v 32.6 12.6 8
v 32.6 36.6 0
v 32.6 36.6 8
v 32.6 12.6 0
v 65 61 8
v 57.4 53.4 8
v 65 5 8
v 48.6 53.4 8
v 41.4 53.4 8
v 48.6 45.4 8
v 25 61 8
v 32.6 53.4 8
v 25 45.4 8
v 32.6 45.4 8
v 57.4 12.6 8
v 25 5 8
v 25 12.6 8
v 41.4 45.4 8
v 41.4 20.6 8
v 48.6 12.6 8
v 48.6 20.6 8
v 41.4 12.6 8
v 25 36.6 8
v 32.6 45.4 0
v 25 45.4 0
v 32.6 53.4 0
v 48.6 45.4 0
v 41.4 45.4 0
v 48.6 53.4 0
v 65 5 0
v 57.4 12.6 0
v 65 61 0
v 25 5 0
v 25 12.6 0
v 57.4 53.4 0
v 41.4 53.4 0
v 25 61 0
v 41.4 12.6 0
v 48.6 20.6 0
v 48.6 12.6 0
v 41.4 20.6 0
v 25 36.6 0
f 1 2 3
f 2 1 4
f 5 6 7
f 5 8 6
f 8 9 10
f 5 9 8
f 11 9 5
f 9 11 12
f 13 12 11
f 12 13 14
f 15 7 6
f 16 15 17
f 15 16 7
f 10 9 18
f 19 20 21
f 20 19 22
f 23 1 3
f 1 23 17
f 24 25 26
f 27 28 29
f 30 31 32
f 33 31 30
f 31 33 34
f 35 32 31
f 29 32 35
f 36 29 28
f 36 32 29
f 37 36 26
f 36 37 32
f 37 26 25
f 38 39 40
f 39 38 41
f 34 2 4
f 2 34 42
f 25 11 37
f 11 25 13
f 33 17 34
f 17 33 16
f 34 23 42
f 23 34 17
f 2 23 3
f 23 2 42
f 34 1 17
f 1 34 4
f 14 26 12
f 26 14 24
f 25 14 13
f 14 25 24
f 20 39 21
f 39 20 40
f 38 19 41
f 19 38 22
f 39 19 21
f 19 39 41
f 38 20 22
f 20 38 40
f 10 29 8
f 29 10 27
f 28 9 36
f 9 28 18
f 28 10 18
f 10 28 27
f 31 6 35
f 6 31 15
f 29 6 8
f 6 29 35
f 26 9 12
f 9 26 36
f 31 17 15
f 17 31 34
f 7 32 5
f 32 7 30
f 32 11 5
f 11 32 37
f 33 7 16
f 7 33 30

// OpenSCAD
difference() {
  translate([45.0000000000, 33.0001196000, 4.0000000000]) {
    scale([40.0000000000, 56.0000000000, 8.0000000000]) {
      translate([-0.5000000000, -0.5000000000, -0.5000000000]) {
        cube([1, 1, 1]);
      }
    }
  }
  difference() {
    translate([41.1999210000, 32.9999376000, 4.0000000000]) {
      scale([32.4000000000, 40.8000000000, 8.0000000000]) {
        translate([-0.5000000000, -0.5000000000, -0.5000000000]) {
          cube([1, 1, 1]);
        }
      }
    }
    union() {
      union() {
        union() {
          translate([28.8000000000, 24.6000000000, 4.0000000000]) {
            scale([7.6000000000, 24.0000000000, 8.0000000000]) {
              translate([-0.5000000000, -0.5000000000, -0.5000000000]) {
                cube([1, 1, 1]);
              }
            }
          }
          translate([28.8000000000, 49.4000000000, 4.0000000000]) {
            scale([7.6000000000, 8.0000000000, 8.0000000000]) {
              translate([-0.5000000000, -0.5000000000, -0.5000000000]) {
                cube([1, 1, 1]);
              }
            }
          }
        }
        translate([45.0000000000, 16.6000000000, 4.0000000000]) {
          scale([7.2000000000, 8.0000000000, 8.0000000000]) {
            translate([-0.5000000000, -0.5000000000, -0.5000000000]) {
              cube([1, 1, 1]);
            }
          }
        }
      }
      translate([45.0000000000, 49.4000000000, 4.0000000000]) {
        scale([7.2000000000, 8.0000000000, 8.0000000000]) {
          translate([-0.5000000000, -0.5000000000, -0.5000000000]) {
            cube([1, 1, 1]);
          }
        }
      }
    }
  }
}
